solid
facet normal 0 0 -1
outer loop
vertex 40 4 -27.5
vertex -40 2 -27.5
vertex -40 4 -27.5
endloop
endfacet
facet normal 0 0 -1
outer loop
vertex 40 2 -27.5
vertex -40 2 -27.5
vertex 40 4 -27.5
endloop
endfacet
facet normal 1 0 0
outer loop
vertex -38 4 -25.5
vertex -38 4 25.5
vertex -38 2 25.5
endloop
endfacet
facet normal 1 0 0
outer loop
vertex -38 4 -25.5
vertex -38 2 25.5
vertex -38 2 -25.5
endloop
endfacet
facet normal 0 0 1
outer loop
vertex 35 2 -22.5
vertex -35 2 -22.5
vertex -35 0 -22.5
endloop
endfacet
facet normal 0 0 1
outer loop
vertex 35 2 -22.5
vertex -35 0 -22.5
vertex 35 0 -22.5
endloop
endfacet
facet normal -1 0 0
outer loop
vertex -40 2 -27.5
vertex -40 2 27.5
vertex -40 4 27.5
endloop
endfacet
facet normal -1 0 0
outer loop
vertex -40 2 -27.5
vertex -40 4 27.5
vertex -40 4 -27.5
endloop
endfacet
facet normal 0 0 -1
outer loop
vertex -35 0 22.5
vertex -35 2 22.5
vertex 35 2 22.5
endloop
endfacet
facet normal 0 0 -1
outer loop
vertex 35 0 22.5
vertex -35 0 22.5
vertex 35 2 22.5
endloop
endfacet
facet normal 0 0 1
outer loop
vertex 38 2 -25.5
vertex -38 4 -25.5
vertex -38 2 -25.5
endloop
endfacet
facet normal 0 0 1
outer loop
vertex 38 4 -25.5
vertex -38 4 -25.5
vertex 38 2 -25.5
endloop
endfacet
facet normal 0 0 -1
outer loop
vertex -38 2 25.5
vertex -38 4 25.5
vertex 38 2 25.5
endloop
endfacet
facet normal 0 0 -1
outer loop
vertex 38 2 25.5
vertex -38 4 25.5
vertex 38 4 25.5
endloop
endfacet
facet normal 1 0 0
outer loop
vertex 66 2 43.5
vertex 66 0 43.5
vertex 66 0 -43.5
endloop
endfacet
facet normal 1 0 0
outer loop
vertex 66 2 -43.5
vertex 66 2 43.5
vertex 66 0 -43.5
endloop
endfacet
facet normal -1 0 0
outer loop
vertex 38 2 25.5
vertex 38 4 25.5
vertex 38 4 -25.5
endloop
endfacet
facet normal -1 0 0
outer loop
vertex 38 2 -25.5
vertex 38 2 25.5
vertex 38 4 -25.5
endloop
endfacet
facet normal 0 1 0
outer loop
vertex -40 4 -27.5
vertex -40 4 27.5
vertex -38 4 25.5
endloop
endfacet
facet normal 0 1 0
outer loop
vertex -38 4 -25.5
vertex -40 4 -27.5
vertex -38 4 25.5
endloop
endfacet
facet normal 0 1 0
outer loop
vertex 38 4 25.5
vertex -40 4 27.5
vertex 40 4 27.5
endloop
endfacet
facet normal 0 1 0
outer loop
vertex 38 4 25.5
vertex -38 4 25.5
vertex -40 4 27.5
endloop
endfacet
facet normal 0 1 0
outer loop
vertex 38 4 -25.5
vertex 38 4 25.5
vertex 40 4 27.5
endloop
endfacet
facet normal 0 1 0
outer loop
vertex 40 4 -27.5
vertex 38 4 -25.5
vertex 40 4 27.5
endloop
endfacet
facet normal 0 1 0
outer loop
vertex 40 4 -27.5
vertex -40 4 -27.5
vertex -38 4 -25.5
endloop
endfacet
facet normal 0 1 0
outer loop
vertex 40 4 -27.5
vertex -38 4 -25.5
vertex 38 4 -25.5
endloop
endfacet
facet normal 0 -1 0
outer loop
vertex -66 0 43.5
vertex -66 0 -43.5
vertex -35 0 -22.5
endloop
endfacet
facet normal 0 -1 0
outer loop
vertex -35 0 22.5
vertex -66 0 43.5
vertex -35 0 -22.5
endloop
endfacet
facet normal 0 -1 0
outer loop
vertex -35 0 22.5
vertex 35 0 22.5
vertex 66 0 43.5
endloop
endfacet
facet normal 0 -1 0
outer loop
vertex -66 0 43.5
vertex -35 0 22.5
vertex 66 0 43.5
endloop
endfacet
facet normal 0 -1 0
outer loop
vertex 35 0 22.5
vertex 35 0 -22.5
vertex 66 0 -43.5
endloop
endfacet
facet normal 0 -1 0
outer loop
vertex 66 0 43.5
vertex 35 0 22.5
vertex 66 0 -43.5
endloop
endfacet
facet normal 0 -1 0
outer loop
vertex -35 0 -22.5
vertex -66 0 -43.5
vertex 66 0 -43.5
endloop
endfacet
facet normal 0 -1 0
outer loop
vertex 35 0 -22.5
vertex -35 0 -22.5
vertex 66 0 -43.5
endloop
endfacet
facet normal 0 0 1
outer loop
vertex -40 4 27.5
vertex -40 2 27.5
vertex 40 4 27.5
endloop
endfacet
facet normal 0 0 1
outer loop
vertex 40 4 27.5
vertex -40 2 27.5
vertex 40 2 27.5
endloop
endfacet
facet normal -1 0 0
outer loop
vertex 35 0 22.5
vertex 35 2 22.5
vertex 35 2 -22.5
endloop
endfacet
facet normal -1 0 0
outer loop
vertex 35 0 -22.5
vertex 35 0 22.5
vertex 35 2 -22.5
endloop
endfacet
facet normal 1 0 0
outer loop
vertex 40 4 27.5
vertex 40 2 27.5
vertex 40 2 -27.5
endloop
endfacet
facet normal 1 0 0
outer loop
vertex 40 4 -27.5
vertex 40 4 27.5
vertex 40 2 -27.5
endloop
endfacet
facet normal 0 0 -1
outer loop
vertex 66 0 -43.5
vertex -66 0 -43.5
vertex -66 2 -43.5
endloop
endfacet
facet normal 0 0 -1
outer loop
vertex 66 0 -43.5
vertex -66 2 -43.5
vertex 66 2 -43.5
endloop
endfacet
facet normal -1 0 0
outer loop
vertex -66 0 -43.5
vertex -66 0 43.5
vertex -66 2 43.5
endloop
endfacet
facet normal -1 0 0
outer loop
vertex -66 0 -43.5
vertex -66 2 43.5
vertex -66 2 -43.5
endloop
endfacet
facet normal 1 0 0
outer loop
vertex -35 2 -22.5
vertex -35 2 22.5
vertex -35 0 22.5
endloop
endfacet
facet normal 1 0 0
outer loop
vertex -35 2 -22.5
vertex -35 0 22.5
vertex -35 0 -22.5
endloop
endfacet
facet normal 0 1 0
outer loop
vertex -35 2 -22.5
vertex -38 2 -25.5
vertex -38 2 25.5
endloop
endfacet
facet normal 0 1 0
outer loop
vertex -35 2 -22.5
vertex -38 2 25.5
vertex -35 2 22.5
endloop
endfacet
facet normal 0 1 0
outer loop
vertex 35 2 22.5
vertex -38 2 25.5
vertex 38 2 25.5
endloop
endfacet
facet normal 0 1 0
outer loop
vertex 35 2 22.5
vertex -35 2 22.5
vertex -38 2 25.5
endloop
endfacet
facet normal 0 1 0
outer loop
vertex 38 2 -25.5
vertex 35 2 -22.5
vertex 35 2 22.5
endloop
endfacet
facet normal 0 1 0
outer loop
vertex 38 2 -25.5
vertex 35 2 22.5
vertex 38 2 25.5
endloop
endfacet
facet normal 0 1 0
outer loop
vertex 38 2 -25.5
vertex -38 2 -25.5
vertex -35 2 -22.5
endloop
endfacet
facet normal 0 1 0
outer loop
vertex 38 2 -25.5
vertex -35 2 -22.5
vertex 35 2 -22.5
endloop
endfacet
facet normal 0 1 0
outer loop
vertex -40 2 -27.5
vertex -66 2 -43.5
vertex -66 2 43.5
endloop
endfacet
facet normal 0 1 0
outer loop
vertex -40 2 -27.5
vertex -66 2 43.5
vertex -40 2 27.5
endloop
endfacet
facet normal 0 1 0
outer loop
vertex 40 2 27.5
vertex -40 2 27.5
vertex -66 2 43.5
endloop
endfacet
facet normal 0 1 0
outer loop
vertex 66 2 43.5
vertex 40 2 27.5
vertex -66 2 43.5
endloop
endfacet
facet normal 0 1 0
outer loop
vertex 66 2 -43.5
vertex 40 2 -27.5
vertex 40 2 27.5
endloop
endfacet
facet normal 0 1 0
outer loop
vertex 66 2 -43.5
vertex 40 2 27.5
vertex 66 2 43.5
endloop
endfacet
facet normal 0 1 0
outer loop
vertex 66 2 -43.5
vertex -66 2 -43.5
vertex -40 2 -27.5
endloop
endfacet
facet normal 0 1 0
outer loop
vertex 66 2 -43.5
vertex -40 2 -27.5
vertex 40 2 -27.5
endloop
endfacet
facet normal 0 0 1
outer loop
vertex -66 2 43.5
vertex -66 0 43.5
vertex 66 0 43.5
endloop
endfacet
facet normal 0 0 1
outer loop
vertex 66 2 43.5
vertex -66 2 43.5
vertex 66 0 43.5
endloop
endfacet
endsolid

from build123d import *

# Parameters (mm, degrees)
SKETCH1_W           = 132
SKETCH1_H           = 87
BOSS_EXTRUDE1_DEPTH = 2
SKETCH2_W           = 80
SKETCH2_H           = 55
BOSS_EXTRUDE2_DEPTH = 2
SKETCH3_W           = 76
SKETCH3_H           = 51
CUT_EXTRUDE1_DEPTH  = 2
SKETCH4_W           = 70
SKETCH4_H           = 45
CUT_EXTRUDE2_DEPTH  = 2


with BuildPart() as part:
    # Sketch1 → Boss-Extrude1 (new body)
    with BuildSketch(Plane(origin=(0, 0, 0), x_dir=(1, 0, 0), z_dir=(0, 1, 0))):
        Rectangle(SKETCH1_W, SKETCH1_H)
    extrude(amount=BOSS_EXTRUDE1_DEPTH)

    # Sketch2 → Boss-Extrude2 (add)
    with BuildSketch(Plane(origin=(0, 2, 0), x_dir=(1, 0, 0), z_dir=(0, 1, 0))):
        Rectangle(SKETCH2_W, SKETCH2_H)
    extrude(amount=BOSS_EXTRUDE2_DEPTH)

    # Sketch3 → Cut-Extrude1 (cut)
    with BuildSketch(Plane(origin=(0, 4, 0), x_dir=(1, 0, 0), z_dir=(0, 1, 0))):
        Rectangle(SKETCH3_W, SKETCH3_H)
    extrude(amount=-CUT_EXTRUDE1_DEPTH, mode=Mode.SUBTRACT)

    # Sketch4 → Cut-Extrude2 (cut)
    with BuildSketch(Plane(origin=(0, 2, 0), x_dir=(1, 0, 0), z_dir=(0, 1, 0))):
        Rectangle(SKETCH4_W, SKETCH4_H)
    extrude(amount=-CUT_EXTRUDE2_DEPTH, mode=Mode.SUBTRACT)


solid = part.part
